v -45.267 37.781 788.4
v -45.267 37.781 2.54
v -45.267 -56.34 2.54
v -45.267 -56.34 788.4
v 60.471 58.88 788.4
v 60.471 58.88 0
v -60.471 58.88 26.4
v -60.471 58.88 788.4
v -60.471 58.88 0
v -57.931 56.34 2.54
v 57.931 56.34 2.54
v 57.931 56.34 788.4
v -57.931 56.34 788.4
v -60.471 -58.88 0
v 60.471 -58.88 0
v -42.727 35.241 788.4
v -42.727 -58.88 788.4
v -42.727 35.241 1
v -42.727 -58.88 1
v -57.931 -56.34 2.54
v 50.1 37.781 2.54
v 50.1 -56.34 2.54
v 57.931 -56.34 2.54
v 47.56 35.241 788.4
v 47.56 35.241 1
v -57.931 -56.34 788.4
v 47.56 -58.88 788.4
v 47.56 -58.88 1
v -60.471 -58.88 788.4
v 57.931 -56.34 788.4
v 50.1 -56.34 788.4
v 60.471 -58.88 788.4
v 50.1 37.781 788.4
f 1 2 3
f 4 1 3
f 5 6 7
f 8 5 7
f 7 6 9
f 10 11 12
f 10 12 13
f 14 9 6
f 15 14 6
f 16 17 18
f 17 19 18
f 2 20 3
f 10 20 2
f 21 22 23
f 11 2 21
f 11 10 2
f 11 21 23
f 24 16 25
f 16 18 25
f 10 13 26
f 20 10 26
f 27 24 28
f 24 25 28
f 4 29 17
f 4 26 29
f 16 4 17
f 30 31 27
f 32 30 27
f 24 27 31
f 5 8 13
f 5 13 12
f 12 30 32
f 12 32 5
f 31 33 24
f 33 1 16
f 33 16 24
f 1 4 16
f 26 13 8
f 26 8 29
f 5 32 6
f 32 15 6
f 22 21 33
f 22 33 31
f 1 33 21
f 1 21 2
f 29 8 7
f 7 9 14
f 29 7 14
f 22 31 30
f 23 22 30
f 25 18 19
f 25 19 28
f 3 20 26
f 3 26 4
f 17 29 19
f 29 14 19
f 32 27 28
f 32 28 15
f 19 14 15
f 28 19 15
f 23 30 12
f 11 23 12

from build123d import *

# Parameters (mm, degrees)
F0_W        = 120.9424138069
F0_H        = 117.7590936422
F1_DEPTH    = 1
F4_DEPTH    = 25.4
F5_DEPTH    = 762
F6_T        = 2.54
F6_T3_DEPTH = 792.48
F6_T5_DEPTH = 99.200644033
F6_T7_DEPTH = 95.3667019176


# Not quite as in the source:
# - a shell that OpenCascade refuses in one call is made with other operations: the cavity is built on its own and cut out


with BuildPart() as f1:
    # F0 (on Top) → F1 (new body)
    with BuildSketch(Plane.XY):
        Rectangle(F0_W, F0_H)
    extrude(amount=F1_DEPTH)

    # F3 (on face) → F4 (join)
    with BuildSketch(Plane.XY.offset(1)):
        Polygon((-60.4712069035, 58.8795468211), (-60.4712069035, -58.8795468211), (-42.7266806364, -58.8795468211), (-42.7266806364, 35.2410972118), (47.5600212812, 35.2410972118), (47.5600212812, -58.8795468211), (60.4712069035, -58.8795468211), (60.4712069035, 58.8795468211), align=None)
    extrude(amount=F4_DEPTH)

    # F5 (add): a face of the model
    f5_faces = [f1.faces().sort_by_distance(p)[0] for p in [
        (-58.7831822711, 0, 26.4),
    ]]
    extrude(f5_faces, amount=F5_DEPTH)

    # F6: shell of thickness 2.54, made by hand


with BuildPart() as f6_core1:
    # F6_t2: copy of F1
    add(f1.part)

    # the walls: a layer under each face that stays
    f6_faces = [f6_core1.faces().sort_by_distance(p)[0] for p in [
        (0, 58.8795468211, 394.2),
        (0, 0, 0),
        (-51.8324630601, -58.8795468211, 732.0857142857),
        (47.5600212812, -11.8192248046, 394.7),
        (2.4166703224, 35.2410972118, 394.7),
        (2.4166703224, -11.8192248046, 1),
        (-42.7266806364, -11.8192248046, 394.7),
        (-60.4712069035, 0, 394.2),
        (60.4712069035, 0, 394.2),
    ]]
    thicken(f6_faces, amount=-F6_T, mode=Mode.SUBTRACT)

    # F6_s4 → F6_t3 (cut)
    with BuildSketch(Plane.XY.offset(-1.54)):
        Polygon((47.5346212812, 35.2156972118), (50.1000212812, 35.2410972118), (50.1000212812, 37.7810972118), (47.5600212812, 37.7810972118), align=None)
        Polygon((-42.7012806364, 35.2156972118), (-42.7266806364, 37.7810972118), (-45.2666806364, 37.7810972118), (-45.2666806364, 35.2410972118), align=None)
    extrude(amount=F6_T3_DEPTH, mode=Mode.SUBTRACT)

    # F6_s6 → F6_t5 (cut)
    with BuildSketch(Plane.XZ.offset(-37.7810972118)):
        Polygon((47.5346212812, 1.0254), (50.1000212812, 1), (50.1000212812, -1.54), (47.5600212812, -1.54), align=None)
        Polygon((-42.7012806364, 1.0254), (-42.7266806364, -1.54), (-45.2666806364, -1.54), (-45.2666806364, 1), align=None)
    extrude(amount=F6_T5_DEPTH, mode=Mode.SUBTRACT)

    # F6_s8 → F6_t7 (cut)
    with BuildSketch(Plane.YZ.offset(-45.2666806364)):
        Polygon((35.2156972118, 1.0254), (37.7810972118, 1), (37.7810972118, -1.54), (35.2410972118, -1.54), align=None)
    extrude(amount=F6_T7_DEPTH, mode=Mode.SUBTRACT)


with BuildPart() as f1_1:
    add(f1.part)

    # what is left inside the walls is the cavity
    f6_cavity = [f6_core1.part.solids().sort_by_distance(p)[0] for p in [
        (0, 56.314147, 526.446667),
    ]]
    add(f6_cavity, mode=Mode.SUBTRACT)


solid = f1_1.part
